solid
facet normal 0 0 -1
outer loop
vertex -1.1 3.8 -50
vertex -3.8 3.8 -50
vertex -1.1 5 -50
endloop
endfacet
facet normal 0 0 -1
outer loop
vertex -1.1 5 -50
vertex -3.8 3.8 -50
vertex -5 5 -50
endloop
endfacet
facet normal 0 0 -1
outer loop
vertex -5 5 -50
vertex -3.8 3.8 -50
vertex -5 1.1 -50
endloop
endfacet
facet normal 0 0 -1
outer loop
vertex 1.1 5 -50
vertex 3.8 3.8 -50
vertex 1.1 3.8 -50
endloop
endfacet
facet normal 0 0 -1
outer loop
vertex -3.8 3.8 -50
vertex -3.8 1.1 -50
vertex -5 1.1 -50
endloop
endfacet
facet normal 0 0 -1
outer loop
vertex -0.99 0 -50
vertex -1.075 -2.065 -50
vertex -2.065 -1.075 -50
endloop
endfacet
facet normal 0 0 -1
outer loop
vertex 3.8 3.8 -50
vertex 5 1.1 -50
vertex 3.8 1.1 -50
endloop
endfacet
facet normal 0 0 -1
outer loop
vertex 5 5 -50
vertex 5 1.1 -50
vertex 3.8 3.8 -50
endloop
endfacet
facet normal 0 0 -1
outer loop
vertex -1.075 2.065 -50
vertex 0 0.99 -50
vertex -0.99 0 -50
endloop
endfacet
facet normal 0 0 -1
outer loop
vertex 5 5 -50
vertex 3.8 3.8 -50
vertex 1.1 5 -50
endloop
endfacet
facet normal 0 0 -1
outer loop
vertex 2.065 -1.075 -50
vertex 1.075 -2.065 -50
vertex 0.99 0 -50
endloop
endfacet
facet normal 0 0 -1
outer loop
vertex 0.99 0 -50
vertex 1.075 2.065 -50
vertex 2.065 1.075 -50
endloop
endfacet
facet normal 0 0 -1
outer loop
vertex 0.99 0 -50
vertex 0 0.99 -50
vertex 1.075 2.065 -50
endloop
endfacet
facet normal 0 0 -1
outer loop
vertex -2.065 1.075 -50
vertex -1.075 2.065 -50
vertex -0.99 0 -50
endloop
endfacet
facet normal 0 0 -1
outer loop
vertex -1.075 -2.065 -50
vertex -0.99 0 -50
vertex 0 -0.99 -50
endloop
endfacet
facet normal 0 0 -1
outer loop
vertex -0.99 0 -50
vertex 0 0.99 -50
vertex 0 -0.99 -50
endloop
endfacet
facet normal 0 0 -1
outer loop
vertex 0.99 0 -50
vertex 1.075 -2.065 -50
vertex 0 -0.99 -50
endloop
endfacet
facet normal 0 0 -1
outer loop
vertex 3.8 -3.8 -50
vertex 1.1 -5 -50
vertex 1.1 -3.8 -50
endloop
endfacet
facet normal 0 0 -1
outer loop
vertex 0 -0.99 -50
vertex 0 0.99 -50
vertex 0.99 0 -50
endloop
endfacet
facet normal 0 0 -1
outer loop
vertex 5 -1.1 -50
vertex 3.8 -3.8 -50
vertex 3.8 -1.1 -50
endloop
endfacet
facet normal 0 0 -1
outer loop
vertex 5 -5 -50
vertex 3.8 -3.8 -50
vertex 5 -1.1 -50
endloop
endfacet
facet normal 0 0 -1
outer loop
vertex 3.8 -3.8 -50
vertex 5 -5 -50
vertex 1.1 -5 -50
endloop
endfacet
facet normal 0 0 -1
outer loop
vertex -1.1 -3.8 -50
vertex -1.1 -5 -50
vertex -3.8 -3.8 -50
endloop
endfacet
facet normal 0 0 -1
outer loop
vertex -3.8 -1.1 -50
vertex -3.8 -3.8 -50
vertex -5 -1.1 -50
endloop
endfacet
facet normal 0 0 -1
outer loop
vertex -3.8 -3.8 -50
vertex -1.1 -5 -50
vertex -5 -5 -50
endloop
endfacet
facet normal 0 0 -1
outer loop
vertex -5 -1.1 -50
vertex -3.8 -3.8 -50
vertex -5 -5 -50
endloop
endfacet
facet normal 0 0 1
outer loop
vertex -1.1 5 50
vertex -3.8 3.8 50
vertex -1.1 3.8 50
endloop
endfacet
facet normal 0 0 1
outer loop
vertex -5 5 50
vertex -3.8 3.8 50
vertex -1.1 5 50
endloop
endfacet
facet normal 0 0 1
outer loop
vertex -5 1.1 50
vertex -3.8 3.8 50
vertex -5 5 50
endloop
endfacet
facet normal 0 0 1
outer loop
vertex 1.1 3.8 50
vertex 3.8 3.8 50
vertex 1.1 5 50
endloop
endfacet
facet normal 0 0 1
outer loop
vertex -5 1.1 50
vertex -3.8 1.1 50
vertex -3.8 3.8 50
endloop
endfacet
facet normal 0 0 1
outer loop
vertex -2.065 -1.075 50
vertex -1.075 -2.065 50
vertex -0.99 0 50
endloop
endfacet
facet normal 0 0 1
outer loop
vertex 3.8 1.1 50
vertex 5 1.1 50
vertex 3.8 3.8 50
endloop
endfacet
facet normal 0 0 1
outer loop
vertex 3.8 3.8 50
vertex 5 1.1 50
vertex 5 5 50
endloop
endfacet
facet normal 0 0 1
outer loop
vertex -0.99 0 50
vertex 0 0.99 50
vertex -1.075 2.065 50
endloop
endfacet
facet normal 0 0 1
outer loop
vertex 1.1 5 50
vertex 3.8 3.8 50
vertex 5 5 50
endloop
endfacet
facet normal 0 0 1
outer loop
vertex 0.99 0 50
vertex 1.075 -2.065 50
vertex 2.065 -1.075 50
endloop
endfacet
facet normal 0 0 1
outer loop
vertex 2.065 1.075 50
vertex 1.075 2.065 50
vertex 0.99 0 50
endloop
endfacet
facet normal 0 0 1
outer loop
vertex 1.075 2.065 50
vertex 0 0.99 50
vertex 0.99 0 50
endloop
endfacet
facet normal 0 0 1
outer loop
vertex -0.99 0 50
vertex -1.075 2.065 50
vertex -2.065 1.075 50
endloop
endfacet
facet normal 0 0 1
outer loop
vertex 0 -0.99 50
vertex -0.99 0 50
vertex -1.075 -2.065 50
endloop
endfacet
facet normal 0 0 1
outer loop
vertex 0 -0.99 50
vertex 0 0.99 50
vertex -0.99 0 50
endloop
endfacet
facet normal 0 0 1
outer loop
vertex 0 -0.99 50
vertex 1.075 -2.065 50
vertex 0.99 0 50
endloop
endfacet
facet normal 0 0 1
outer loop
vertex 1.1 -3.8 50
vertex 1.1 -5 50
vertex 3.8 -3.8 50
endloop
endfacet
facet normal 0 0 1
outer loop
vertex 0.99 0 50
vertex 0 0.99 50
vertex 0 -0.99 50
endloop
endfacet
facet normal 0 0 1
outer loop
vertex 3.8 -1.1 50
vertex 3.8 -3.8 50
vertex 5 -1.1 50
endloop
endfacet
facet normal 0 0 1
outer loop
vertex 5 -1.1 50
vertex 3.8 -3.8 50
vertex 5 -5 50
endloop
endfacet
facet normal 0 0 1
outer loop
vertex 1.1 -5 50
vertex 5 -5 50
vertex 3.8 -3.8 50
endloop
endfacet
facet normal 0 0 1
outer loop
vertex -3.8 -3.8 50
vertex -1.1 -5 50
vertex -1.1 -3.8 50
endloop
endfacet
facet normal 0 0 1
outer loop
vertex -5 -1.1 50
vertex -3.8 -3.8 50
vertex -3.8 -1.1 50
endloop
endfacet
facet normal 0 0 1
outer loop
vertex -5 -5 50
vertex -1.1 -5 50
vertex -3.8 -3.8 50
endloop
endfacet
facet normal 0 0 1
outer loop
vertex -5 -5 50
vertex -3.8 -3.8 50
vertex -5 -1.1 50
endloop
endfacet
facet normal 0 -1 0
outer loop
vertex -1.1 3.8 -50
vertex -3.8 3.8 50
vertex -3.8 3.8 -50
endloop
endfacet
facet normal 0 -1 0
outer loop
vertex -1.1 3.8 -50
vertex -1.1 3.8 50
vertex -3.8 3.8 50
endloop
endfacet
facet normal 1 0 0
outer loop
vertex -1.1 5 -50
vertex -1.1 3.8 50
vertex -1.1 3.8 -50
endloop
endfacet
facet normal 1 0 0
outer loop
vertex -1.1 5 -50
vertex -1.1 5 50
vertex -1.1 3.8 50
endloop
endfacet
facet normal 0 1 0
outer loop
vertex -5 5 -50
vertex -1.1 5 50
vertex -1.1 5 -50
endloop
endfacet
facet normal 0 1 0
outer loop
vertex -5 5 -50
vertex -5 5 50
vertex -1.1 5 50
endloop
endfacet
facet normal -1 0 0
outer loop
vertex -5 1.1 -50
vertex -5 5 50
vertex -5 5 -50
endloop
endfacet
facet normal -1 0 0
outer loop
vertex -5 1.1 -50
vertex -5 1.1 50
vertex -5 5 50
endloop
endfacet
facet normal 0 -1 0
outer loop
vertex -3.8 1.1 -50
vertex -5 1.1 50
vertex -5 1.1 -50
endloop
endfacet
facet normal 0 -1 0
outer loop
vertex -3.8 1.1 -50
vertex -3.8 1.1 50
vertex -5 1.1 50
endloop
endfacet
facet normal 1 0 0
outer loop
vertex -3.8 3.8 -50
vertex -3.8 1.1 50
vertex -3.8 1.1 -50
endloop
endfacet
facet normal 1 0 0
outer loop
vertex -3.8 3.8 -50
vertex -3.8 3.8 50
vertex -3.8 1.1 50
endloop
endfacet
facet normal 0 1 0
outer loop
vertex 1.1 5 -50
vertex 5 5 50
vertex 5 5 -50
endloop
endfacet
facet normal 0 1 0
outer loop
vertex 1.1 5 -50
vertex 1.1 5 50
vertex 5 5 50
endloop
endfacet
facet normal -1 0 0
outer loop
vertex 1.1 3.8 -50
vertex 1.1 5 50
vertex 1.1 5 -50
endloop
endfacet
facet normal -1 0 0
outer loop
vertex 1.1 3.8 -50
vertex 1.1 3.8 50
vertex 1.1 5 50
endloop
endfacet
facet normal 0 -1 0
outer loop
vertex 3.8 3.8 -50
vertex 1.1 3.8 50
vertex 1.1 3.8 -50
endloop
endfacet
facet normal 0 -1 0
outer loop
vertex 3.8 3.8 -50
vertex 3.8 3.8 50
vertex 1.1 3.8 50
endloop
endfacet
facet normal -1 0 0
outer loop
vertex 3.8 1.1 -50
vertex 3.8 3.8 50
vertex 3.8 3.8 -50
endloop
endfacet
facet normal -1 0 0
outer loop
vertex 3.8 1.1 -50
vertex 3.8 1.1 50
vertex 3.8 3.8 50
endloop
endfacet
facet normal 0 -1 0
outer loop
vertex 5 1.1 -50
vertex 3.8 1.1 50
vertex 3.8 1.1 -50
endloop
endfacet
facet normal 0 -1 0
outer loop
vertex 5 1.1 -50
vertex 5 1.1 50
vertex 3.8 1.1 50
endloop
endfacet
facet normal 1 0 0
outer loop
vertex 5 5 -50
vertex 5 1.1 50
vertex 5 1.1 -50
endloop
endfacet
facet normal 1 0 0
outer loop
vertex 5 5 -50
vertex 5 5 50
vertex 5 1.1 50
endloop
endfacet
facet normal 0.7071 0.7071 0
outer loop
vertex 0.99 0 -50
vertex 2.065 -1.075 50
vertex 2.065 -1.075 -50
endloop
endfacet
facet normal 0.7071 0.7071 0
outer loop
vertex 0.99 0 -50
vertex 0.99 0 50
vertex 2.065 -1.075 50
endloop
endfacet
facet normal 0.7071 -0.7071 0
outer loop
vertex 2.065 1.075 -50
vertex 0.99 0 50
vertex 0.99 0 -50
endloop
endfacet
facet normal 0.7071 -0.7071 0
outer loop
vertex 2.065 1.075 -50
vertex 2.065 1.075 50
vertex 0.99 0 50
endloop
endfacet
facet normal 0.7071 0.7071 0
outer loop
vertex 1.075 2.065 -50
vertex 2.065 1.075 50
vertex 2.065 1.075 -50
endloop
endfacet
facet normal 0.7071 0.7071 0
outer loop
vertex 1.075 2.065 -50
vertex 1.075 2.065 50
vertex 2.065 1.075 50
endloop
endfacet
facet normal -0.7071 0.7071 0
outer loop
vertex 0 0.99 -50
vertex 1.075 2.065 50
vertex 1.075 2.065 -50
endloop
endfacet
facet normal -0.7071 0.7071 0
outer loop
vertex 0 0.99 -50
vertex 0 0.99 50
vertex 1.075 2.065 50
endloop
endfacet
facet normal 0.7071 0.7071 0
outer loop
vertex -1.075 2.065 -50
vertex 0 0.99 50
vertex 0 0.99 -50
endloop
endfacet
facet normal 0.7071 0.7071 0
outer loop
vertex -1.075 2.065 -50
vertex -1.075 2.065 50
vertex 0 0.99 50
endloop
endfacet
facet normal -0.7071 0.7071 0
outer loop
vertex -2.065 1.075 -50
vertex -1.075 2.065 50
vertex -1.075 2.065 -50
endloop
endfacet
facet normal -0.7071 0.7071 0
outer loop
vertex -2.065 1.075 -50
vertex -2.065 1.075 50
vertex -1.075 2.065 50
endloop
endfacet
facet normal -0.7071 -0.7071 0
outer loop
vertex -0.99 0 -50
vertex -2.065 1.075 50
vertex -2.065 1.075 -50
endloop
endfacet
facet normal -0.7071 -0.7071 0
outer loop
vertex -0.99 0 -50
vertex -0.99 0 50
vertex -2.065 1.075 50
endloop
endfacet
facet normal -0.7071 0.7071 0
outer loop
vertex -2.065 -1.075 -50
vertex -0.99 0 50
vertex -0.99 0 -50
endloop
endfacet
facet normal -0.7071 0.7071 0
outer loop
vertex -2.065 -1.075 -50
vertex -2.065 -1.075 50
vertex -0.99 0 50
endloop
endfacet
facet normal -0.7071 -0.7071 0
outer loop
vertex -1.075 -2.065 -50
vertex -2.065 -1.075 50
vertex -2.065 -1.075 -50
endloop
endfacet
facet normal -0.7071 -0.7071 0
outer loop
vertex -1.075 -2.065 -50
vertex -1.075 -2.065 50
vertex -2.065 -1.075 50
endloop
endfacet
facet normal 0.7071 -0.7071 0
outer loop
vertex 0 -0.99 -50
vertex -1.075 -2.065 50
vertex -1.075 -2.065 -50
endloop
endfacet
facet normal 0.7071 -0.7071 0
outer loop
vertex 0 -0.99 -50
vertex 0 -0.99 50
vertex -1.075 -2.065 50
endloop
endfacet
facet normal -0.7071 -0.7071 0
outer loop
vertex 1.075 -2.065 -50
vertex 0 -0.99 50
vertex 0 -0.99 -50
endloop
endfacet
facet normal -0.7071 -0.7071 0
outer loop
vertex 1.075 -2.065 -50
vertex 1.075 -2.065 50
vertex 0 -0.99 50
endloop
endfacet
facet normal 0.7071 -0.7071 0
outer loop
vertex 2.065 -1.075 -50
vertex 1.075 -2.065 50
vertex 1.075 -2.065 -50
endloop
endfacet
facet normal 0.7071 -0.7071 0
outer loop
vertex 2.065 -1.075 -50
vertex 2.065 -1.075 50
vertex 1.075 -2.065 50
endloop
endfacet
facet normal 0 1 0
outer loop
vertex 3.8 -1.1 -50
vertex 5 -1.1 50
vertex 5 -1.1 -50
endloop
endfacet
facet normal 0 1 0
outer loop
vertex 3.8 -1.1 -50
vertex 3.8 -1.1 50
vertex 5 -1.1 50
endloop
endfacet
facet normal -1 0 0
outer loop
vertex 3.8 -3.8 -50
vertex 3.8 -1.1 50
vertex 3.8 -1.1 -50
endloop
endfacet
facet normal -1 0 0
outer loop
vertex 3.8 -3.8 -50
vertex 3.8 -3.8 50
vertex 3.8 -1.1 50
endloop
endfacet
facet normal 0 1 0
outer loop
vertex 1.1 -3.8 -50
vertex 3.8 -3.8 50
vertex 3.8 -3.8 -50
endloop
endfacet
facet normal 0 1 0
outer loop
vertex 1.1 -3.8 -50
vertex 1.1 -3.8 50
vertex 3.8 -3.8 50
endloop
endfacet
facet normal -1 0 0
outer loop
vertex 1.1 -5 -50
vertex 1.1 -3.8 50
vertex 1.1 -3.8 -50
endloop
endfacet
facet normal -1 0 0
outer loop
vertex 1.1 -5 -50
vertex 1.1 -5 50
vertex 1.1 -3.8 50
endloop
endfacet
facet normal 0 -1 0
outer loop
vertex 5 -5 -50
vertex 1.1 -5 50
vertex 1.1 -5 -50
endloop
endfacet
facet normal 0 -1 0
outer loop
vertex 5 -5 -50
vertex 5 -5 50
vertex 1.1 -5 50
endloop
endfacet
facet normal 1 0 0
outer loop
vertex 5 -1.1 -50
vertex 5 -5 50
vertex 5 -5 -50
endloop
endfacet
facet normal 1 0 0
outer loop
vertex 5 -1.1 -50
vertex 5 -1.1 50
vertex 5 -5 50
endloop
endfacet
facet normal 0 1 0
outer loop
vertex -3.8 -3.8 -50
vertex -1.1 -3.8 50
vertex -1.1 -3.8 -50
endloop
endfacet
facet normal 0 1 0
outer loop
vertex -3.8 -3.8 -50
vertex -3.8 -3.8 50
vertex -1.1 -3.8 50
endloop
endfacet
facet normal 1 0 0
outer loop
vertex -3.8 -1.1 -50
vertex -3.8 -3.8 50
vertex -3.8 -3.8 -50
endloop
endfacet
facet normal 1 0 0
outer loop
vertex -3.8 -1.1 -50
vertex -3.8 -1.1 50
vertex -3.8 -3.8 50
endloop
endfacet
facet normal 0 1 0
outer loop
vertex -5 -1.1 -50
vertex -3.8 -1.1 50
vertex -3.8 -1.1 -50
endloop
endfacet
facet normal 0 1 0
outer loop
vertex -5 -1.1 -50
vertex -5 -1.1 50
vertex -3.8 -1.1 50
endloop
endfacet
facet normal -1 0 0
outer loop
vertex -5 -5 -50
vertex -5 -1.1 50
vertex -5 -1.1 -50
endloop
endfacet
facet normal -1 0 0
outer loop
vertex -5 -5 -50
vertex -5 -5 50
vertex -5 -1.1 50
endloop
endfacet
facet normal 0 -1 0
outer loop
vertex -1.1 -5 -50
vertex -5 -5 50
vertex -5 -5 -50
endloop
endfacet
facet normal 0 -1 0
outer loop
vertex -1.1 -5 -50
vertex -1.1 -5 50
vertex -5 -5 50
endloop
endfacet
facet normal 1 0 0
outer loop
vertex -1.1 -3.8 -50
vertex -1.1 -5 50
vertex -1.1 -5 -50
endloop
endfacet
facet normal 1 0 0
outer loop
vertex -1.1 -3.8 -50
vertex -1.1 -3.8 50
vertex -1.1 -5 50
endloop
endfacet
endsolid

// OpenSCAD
$fn = 96;

// 10x10mm aluminum extrusion profile, 100mm long
size   = 10.0;     // mm (square cross-section)
length = 100.0;    // mm

// Profile parameters (derived from size)
wall        = size * 0.12;   // outer wall thickness
slot_w      = size * 0.22;   // T-slot opening width
slot_depth  = size * 0.28;   // depth from outer face to inner cavity
core_r      = size * 0.16;   // central bore radius
web_w       = size * 0.14;   // diagonal web thickness
eps         = 0.02;          // small overlap to avoid coincident faces

module extrusion10_profile_2d() {
    // Build as: (outer ring with slots removed) UNION (webs)
    // Ensures one connected solid and avoids accidental "all-subtracted" geometry.
    union() {
        // Outer ring with T-slot openings cut in
        difference() {
            // Outer square
            square([size, size], center=true);

            // Inner cavity (keeps outer wall)
            square([size - 2*wall, size - 2*wall], center=true);

            // Four T-slot channels (open to each face)
            for (a = [0:90:270]) {
                rotate(a)
                    translate([0, size/2 - slot_depth/2 + eps])
                        square([slot_w, slot_depth + 2*eps], center=true);
            }
        }

        // Diagonal webs to connect outer ring to core region
        for (a = [45:90:315]) {
            rotate(a)
                square([web_w, (size/2 - wall - core_r) * 2 + 2*eps], center=true);
        }
    }
}

// Extrude along Z; center it so orthographic views clearly show 10x10 cross-section
linear_extrude(height=length, center=true, convexity=10)
    extrusion10_profile_2d();
